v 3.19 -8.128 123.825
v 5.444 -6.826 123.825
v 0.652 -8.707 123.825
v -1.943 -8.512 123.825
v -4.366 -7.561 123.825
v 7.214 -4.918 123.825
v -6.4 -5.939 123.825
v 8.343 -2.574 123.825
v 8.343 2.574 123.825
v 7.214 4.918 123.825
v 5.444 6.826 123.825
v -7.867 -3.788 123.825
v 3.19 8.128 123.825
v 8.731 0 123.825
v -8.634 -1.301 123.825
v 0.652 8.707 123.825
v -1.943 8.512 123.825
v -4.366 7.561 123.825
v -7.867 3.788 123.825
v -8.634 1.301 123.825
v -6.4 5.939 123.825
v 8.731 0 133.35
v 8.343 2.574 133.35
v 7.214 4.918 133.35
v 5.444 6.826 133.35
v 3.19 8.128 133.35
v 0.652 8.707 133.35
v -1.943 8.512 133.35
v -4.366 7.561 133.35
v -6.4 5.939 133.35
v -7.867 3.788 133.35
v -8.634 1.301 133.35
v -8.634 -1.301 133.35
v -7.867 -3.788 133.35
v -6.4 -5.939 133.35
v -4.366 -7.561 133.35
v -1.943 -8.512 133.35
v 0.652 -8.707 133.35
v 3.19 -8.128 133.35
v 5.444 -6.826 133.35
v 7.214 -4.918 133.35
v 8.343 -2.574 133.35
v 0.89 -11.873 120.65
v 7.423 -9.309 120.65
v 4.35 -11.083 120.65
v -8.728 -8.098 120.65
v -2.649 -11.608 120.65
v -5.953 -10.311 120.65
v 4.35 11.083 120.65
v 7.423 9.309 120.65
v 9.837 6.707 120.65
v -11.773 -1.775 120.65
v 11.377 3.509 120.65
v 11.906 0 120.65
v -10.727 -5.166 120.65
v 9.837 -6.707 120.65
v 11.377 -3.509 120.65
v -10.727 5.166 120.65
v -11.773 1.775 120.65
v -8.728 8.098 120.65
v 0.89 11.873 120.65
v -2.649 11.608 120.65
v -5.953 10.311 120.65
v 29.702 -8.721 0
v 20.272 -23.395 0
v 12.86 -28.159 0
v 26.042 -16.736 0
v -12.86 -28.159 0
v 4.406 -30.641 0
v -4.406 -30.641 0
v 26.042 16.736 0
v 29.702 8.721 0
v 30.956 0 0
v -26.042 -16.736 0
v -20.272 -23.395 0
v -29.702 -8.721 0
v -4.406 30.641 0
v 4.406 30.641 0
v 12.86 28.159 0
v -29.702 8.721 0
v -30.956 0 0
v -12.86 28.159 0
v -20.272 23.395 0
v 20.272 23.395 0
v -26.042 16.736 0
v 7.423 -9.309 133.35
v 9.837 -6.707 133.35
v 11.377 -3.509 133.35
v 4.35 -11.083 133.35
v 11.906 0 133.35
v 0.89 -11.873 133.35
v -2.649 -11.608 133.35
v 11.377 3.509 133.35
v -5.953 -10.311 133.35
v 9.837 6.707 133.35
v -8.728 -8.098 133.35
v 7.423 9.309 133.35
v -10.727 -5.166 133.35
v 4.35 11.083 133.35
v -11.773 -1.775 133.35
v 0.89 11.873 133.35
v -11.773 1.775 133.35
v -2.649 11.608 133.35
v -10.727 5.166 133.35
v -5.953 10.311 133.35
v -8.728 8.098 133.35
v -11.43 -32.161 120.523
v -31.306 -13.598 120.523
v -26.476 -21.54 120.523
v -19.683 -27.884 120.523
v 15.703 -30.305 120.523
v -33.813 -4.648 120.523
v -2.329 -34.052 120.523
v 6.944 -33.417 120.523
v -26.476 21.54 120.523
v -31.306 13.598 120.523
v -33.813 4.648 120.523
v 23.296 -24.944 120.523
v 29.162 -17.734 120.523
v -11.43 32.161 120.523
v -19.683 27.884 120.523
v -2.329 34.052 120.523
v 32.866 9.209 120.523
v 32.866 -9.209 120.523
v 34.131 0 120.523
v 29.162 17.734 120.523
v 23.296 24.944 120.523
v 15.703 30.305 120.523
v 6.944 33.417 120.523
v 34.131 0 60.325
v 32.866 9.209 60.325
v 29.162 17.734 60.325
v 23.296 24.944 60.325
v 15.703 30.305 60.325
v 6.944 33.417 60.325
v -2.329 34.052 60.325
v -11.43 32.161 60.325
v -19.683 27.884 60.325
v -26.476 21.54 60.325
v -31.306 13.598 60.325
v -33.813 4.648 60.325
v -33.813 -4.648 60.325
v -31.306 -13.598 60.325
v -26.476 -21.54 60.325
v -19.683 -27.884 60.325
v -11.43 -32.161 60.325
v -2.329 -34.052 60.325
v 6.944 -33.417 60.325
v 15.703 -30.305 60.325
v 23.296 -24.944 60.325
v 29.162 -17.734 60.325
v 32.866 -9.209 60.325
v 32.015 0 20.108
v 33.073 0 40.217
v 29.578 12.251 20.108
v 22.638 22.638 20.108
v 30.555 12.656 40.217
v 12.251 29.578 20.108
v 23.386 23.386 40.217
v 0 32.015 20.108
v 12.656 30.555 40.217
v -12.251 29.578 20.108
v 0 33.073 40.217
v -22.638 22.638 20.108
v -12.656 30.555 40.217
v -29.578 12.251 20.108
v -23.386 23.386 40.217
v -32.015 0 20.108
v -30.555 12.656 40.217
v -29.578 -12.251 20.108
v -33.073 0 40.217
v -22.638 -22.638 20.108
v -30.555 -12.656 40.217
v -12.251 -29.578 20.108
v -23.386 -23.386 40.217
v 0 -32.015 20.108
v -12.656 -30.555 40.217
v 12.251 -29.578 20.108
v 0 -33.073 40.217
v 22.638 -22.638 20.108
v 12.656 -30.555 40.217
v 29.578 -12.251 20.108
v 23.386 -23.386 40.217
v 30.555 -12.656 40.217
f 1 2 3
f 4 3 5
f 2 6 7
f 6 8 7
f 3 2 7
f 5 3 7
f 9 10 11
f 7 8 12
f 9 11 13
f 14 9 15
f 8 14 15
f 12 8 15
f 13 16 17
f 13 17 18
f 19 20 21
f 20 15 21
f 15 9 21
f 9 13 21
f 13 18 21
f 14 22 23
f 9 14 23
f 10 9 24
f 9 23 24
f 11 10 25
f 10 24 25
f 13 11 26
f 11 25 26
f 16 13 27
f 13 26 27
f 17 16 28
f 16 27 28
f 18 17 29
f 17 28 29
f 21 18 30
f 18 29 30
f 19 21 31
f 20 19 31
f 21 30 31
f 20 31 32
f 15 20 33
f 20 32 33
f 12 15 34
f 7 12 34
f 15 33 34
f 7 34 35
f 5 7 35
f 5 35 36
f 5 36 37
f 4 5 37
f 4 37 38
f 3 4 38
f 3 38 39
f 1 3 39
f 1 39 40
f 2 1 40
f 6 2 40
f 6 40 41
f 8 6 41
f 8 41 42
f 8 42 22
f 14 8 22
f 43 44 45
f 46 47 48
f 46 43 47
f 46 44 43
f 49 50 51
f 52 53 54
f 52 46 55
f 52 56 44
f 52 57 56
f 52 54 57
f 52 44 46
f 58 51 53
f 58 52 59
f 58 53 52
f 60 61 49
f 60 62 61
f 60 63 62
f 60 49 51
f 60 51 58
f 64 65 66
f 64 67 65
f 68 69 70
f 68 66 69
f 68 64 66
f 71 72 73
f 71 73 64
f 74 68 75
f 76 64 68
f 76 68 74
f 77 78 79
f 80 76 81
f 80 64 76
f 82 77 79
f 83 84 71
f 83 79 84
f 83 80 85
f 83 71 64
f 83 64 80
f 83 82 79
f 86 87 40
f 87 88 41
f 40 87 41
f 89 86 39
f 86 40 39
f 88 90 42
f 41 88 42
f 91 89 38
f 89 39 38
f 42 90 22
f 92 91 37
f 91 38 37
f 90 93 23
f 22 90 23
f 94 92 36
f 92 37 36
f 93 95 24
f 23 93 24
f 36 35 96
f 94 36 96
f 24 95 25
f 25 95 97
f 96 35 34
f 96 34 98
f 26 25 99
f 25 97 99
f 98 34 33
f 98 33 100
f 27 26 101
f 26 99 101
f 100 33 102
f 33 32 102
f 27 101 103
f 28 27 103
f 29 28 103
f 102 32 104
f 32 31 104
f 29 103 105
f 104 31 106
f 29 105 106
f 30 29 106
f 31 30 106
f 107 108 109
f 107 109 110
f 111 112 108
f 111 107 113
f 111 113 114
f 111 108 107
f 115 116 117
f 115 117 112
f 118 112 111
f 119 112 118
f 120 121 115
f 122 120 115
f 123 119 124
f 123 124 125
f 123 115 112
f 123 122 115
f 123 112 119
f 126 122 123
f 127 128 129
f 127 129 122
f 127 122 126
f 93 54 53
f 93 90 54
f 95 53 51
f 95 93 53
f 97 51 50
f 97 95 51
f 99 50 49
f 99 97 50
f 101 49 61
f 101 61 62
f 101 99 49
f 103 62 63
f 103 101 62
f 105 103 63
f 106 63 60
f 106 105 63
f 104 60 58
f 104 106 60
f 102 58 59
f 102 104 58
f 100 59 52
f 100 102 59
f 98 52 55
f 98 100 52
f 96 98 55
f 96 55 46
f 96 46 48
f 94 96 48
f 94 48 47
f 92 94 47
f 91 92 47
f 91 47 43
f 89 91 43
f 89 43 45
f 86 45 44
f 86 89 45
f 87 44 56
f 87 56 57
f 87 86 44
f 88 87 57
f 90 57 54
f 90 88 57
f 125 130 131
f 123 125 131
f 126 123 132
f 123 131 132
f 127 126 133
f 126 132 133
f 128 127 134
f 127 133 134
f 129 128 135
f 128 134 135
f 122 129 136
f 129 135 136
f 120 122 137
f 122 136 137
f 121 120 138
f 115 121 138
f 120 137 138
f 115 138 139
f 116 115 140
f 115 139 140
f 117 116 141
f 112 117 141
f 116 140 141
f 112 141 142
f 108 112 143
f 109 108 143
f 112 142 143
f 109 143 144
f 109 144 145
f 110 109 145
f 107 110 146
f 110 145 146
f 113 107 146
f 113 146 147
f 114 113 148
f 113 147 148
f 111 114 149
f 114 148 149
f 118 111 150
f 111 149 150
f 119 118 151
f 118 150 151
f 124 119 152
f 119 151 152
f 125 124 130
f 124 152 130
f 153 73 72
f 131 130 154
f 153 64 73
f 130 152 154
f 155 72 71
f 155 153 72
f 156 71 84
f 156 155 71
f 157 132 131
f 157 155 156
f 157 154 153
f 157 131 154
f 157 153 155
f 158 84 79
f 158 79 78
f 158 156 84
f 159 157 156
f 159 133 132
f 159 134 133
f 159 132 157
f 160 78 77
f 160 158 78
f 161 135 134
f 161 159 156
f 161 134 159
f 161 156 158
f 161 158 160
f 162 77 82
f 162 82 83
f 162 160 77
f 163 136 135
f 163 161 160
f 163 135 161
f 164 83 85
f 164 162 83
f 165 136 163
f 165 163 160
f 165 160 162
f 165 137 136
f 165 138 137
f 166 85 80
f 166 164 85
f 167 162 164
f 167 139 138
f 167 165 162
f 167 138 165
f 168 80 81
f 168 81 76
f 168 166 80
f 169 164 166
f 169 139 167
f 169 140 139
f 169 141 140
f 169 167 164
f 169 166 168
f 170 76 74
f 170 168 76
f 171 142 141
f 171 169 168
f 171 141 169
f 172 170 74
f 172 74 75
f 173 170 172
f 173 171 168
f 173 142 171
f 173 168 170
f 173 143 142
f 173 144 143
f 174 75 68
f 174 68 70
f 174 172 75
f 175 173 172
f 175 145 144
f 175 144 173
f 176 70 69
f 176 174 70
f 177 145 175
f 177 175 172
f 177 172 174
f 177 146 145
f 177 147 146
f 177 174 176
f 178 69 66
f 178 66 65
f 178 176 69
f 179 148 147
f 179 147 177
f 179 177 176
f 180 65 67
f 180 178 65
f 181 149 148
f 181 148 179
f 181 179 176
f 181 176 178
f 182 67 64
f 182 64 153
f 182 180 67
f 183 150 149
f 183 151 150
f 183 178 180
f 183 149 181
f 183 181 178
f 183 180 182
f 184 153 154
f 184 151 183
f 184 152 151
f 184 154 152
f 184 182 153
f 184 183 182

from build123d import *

# Parameters (mm, degrees)
F0_W     = 11.90625
F0_H     = 12.7
F2_T     = -3.175
F3_DEPTH = 60.198


with BuildPart() as f1:
    # F0 (on Front) → F1 (revolve)
    with BuildSketch(Plane.XZ):
        with Locations((5.953125, 127)):
            Rectangle(F0_W, F0_H)
    revolve(axis=Axis((0, 0, 60.325), (0, 0, 1)))

    # F2
    f2_openings = [f1.faces().sort_by_distance(p)[0] for p in [
        (0, 0, 133.35),
    ]]
    offset(amount=F2_T, openings=f2_openings)


with BuildPart() as f1b:
    # F0 (on Front) → F1, piece 2 (revolve)
    with BuildSketch(Plane.XZ):
        Polygon((0, 60.325), (0, 0), (30.95625, 0), (34.13125, 60.325), align=None)
    revolve(axis=Axis((0, 0, 60.325), (0, 0, 1)))

    # F3 (add): a face of the model
    f3_faces = [f1b.faces().sort_by_distance(p)[0] for p in [
        (0, 0, 60.325),
    ]]
    extrude(f3_faces, amount=F3_DEPTH)


solid = Compound([f1.part, f1b.part])
